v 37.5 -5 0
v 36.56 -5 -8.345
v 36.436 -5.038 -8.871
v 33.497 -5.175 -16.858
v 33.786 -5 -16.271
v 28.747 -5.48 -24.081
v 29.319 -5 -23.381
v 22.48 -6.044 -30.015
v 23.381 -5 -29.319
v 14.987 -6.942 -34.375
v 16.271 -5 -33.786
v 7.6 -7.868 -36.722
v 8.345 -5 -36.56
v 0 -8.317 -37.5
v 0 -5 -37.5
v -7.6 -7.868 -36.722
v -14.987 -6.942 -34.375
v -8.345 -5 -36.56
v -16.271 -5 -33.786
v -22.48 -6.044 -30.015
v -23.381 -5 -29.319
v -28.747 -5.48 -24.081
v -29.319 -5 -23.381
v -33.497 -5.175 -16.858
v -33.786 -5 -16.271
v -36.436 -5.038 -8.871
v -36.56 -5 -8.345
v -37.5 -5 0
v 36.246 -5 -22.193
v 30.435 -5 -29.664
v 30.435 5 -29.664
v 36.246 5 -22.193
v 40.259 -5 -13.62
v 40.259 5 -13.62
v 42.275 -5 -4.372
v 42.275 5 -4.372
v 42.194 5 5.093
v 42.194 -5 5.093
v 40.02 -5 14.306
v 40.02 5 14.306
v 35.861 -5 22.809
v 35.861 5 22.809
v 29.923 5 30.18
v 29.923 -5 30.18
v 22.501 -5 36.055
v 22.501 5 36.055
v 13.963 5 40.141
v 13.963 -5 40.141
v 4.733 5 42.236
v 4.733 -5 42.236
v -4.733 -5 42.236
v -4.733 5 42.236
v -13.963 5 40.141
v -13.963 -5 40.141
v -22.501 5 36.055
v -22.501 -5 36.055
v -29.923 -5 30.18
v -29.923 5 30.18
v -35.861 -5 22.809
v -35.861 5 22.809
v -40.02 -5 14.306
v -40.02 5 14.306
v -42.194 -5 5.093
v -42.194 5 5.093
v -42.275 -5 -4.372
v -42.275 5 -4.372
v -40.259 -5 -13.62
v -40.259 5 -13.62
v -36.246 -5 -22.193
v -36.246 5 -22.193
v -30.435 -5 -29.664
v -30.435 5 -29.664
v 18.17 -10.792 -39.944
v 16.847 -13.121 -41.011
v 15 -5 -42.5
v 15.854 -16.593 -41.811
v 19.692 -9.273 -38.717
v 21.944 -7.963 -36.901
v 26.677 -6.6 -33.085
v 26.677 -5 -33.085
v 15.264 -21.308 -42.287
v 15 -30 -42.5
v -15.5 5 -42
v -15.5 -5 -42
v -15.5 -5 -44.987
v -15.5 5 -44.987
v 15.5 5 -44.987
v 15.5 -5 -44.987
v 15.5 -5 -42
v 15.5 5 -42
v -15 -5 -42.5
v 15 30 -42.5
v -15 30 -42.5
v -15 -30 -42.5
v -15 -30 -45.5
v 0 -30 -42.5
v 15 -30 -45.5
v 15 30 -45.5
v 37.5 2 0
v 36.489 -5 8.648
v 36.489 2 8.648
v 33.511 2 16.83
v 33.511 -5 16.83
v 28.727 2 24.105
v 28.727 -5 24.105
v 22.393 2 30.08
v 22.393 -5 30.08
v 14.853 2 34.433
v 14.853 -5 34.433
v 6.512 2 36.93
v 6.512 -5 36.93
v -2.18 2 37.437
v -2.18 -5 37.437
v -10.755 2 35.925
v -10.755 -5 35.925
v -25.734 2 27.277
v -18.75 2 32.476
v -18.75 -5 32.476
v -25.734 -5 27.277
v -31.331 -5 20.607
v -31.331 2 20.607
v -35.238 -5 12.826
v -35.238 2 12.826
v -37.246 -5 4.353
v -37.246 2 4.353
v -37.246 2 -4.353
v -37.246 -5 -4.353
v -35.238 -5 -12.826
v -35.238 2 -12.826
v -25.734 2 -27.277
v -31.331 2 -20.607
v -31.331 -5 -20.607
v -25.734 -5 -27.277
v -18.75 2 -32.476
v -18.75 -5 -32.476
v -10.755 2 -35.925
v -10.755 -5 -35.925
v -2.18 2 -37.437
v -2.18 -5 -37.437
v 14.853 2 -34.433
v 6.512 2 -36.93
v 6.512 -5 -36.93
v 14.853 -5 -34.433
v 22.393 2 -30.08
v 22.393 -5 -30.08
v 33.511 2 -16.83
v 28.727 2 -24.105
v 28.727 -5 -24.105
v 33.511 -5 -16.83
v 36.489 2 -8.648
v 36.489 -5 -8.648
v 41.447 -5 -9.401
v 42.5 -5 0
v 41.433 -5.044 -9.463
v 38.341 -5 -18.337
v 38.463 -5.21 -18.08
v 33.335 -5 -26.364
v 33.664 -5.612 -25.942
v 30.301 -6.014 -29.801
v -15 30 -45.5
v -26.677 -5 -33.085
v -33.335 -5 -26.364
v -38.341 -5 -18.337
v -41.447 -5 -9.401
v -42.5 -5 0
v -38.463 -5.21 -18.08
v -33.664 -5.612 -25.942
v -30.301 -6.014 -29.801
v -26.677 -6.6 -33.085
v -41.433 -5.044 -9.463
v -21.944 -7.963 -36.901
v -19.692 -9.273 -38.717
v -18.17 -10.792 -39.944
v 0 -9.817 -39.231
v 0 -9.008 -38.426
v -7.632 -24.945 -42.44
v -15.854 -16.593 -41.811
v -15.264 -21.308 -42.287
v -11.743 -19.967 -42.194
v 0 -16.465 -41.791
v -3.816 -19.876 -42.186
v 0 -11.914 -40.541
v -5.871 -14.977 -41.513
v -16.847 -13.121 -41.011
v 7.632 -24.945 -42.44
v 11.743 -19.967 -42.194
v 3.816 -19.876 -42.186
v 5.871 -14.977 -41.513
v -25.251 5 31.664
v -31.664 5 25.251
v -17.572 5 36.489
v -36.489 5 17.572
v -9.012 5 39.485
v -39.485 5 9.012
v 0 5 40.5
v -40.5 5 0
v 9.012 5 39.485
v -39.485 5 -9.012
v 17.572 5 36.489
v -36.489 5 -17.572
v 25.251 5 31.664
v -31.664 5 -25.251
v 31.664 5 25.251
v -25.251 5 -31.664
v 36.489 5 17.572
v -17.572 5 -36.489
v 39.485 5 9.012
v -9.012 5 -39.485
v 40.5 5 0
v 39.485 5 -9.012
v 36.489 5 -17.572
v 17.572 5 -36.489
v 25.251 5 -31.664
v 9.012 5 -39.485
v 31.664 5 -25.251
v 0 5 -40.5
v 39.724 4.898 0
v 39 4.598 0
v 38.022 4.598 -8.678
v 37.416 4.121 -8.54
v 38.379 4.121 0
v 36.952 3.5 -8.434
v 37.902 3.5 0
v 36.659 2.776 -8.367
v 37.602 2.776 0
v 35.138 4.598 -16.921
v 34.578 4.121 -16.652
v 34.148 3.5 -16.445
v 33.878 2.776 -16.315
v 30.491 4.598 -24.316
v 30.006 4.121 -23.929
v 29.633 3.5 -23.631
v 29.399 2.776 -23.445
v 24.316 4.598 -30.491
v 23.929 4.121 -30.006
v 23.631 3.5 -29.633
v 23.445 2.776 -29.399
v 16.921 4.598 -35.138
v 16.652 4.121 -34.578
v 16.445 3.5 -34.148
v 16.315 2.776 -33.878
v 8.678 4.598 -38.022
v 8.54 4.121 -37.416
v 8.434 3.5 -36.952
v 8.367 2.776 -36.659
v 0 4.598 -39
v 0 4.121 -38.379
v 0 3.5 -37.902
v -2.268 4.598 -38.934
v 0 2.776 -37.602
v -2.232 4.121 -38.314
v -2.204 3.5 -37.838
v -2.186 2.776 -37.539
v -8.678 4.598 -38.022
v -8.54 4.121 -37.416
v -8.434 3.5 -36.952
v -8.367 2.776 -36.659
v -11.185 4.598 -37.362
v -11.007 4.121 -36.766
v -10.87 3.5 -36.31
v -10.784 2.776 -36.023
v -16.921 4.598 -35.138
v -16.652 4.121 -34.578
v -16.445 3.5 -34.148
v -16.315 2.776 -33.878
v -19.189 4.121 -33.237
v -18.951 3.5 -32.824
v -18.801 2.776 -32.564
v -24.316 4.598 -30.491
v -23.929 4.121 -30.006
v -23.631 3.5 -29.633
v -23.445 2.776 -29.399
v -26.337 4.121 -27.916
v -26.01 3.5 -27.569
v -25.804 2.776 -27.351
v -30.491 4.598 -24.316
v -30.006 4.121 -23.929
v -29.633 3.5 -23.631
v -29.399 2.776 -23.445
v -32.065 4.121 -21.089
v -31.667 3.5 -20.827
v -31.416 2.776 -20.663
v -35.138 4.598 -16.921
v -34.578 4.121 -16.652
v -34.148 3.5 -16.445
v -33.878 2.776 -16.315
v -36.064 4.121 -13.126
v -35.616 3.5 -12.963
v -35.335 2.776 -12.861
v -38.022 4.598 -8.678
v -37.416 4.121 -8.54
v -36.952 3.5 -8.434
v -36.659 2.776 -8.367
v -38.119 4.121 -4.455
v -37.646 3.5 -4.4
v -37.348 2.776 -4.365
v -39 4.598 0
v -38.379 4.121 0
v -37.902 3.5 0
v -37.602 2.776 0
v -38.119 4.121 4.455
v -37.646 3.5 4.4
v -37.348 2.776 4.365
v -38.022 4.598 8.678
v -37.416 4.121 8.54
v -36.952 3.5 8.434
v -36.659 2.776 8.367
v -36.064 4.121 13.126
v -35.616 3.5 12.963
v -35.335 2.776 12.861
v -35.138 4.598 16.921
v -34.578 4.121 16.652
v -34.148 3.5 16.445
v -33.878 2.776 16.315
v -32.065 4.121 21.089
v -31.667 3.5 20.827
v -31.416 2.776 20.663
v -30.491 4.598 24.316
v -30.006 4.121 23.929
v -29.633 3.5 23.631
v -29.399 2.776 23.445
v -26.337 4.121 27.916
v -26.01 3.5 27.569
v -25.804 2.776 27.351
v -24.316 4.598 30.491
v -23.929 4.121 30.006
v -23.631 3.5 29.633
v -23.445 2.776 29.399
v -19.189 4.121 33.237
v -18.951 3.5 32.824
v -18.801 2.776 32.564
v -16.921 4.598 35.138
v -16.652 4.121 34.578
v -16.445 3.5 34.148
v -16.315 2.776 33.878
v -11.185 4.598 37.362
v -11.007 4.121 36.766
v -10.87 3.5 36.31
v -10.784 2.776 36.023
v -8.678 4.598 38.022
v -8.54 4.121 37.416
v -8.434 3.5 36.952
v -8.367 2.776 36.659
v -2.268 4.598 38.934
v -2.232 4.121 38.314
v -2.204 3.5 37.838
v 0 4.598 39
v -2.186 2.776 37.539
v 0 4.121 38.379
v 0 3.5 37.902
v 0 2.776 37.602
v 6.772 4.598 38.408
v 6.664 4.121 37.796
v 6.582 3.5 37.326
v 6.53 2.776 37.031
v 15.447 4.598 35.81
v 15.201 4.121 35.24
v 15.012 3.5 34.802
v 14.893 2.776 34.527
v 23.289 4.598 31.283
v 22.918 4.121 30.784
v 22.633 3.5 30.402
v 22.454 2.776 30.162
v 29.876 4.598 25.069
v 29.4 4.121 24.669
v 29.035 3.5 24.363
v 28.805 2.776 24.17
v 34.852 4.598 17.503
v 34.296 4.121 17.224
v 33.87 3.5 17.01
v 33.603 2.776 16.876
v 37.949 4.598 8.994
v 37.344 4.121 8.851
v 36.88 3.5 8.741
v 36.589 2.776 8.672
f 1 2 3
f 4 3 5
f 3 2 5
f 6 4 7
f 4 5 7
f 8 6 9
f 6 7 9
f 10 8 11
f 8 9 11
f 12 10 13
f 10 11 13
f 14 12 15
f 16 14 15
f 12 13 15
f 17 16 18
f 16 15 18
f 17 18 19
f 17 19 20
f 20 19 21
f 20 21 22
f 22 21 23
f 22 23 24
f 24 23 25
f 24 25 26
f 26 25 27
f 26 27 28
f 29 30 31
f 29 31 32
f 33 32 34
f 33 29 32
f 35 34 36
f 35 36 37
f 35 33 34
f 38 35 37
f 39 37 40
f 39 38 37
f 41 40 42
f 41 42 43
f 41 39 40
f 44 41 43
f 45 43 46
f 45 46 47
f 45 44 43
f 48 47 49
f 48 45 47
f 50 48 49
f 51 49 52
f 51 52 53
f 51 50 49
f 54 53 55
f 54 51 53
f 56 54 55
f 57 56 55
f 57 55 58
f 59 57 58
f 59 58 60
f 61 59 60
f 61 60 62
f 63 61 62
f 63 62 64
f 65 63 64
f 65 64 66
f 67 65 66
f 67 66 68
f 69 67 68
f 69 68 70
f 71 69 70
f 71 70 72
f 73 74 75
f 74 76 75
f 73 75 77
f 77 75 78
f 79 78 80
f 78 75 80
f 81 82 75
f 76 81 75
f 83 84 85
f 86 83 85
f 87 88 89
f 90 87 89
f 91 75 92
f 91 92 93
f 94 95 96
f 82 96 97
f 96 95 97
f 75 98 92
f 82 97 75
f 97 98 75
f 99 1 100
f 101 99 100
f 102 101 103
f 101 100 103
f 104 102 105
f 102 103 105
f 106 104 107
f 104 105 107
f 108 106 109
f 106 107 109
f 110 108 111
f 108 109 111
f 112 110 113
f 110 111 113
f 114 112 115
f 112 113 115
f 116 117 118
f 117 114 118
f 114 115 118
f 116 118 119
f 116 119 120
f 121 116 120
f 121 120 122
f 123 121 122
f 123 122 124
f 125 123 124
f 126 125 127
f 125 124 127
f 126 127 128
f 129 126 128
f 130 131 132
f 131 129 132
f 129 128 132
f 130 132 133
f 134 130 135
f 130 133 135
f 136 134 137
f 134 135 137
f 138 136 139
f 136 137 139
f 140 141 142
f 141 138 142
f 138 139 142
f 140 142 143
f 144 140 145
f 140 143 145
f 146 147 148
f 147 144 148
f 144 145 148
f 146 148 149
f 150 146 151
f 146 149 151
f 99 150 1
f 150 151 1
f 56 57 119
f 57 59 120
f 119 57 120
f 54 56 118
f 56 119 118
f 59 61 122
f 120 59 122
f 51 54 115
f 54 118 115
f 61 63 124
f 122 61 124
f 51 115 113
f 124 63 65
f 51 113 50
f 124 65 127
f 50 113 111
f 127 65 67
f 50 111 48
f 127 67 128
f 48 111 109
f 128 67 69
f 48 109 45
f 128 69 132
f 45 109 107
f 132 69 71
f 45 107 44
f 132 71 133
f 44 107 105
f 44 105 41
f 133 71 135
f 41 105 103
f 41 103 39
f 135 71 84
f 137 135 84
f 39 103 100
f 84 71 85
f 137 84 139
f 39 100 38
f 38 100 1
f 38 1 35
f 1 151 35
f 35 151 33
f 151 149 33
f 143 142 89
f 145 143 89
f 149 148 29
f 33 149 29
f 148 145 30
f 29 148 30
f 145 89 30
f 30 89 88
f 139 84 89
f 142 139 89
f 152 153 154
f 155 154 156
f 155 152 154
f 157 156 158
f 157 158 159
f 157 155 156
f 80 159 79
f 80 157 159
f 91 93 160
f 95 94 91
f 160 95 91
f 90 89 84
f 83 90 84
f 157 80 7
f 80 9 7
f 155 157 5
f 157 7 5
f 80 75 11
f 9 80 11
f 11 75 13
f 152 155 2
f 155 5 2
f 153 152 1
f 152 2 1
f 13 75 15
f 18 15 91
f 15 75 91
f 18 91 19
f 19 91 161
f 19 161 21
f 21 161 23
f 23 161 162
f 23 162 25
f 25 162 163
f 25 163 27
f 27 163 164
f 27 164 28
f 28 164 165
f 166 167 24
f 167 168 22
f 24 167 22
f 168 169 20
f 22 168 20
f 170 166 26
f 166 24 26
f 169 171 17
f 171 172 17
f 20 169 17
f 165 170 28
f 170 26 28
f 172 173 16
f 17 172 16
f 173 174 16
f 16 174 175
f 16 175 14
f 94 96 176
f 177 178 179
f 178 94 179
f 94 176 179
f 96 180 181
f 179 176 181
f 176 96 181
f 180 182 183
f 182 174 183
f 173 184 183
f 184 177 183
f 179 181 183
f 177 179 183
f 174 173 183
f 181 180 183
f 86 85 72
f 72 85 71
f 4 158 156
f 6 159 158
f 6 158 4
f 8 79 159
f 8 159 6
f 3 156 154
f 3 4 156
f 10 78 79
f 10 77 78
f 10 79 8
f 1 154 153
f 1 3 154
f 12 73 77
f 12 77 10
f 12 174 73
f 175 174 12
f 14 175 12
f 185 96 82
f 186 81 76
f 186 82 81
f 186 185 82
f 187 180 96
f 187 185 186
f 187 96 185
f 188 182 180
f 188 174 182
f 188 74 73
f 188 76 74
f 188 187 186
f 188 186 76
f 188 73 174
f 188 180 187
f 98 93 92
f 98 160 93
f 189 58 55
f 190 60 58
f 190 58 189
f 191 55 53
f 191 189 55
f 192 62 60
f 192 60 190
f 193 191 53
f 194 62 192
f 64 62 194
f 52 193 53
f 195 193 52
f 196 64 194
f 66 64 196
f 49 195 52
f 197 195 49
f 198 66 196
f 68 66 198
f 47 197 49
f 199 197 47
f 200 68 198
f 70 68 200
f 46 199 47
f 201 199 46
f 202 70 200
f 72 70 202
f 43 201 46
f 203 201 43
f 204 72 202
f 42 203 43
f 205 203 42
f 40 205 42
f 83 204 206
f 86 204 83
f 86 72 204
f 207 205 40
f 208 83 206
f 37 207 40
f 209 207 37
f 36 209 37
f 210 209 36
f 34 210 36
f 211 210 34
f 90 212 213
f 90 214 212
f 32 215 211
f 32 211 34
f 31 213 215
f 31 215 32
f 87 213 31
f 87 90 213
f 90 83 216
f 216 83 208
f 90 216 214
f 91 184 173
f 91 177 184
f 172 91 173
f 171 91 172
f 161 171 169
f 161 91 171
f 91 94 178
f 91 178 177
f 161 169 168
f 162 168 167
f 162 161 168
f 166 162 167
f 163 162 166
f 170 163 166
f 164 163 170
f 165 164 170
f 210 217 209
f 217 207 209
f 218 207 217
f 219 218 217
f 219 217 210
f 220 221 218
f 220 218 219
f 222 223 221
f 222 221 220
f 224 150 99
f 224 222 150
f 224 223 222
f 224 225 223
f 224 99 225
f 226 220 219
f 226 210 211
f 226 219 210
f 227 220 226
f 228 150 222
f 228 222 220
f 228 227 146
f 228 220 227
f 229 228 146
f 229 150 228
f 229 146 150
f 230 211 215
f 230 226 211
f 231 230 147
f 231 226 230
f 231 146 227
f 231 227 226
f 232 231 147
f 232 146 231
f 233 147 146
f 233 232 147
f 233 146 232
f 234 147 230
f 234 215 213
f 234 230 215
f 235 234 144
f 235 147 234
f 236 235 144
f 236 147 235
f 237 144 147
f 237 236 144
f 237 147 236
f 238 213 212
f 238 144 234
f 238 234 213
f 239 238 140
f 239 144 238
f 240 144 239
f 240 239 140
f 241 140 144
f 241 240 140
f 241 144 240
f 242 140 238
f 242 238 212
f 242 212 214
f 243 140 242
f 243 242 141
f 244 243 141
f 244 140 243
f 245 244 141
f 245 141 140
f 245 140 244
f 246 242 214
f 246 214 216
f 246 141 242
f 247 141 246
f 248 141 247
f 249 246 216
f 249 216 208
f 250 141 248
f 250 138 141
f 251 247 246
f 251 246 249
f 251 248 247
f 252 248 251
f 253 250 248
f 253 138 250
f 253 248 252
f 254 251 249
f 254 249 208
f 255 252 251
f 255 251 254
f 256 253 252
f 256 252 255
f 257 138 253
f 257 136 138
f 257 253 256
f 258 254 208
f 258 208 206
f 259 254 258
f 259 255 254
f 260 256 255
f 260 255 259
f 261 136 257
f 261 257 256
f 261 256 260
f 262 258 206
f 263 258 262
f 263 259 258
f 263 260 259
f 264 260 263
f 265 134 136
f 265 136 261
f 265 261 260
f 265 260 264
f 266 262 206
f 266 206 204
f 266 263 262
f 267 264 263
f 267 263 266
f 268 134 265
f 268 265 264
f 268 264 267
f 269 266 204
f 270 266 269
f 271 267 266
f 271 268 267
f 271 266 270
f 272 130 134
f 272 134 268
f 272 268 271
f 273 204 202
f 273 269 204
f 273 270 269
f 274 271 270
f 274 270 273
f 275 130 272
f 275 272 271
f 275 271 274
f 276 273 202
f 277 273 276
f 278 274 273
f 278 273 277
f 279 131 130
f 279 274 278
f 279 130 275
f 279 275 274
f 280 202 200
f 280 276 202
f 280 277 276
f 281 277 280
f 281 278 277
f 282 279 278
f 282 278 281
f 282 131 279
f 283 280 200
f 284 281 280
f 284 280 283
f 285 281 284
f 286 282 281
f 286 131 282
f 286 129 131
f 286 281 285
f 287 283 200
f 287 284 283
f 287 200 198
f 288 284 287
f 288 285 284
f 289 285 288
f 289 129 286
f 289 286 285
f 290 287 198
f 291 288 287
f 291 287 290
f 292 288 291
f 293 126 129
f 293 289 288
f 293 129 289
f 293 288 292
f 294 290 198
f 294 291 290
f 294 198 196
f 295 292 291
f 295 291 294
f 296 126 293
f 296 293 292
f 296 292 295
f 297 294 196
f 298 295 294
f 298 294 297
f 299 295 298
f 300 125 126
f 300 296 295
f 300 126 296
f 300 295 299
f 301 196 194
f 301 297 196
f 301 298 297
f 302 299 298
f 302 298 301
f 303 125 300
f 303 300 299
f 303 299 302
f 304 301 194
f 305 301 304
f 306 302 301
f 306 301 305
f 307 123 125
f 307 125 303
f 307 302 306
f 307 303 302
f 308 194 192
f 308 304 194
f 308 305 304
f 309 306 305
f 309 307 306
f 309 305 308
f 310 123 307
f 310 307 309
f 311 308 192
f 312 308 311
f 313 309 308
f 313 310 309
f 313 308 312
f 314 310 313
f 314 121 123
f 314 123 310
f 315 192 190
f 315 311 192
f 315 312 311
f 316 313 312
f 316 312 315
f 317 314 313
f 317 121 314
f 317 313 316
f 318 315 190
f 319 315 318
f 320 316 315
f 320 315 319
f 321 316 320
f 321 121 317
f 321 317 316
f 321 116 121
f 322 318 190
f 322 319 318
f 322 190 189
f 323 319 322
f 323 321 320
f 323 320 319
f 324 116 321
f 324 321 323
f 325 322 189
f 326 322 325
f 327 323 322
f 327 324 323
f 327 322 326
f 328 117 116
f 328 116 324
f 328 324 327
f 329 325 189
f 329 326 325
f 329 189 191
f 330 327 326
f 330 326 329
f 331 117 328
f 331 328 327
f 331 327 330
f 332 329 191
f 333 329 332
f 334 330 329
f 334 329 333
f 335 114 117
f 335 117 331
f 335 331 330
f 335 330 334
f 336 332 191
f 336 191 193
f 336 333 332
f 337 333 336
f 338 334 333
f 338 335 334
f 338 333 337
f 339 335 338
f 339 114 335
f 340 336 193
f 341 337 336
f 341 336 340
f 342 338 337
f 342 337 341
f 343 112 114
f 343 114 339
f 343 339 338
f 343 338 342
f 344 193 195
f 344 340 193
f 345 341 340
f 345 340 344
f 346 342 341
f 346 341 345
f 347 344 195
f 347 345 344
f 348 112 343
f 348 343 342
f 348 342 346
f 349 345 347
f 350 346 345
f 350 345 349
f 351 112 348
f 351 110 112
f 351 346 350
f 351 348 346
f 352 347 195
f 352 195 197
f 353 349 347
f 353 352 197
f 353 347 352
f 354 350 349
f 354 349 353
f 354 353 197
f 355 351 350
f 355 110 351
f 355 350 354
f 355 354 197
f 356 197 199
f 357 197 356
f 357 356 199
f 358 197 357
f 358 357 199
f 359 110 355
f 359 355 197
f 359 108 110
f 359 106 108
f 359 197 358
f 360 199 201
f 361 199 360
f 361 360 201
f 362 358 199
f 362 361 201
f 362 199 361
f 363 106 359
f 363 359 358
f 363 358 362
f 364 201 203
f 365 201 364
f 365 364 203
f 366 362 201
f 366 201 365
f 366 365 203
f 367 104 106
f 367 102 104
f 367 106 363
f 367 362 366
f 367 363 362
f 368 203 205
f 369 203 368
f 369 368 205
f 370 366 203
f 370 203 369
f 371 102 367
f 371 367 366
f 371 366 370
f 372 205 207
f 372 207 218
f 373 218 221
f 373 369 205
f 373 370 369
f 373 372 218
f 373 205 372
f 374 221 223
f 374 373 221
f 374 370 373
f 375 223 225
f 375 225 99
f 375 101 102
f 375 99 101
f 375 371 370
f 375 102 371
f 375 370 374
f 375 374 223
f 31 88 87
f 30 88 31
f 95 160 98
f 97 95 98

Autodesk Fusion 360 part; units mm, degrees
sketch "Sketch1" plane through (0, 0, 0) normal (0, 1, 0) x (1, 0, 0) in component "Stand"
  circle A0 centre (0, 0) radius 37.5
  circle A1 centre (0, 0) radius 42.5
  line L0 (-15, 45.5) -> (15, 45.5)
  line L1 (15, 45.5) -> (15, 42.5)
  line L2 (15, 42.5) -> (-15, 42.5)
  line L3 (-15, 42.5) -> (-15, 45.5)
  line L4 (0, 0) -> (0, 45.5) construction
  line L5 (-15, 45.5) -> (-30.4348, 29.6644)
  line L6 (15, 45.5) -> (30.4348, 29.6644)
  dimension "d1" = 75
  dimension "d2" = 85
  dimension "d3" = 3
  dimension "d4" = 30
extrude "Extrude1" add sketch "Sketch1" along normal mid plane 10 contours A1 | A1 L1 L2 L6 | A1 L2 L3 L5 makes body 1 in component "Stand"
extrude "Extrude1'" add sketch "Sketch1" along normal mid plane 60 separate body contours L0 L1 L2 L3 makes body 2 in component "Clip"
sketch "Sketch1 (2)" plane through (0, 0, 0) normal (1, 0, 0) x (0, 0, -1) in component "Clip"
  line L0 (42.5, 30) -> (42.5, -30) construction
  line L1 (37.5, -5) -> (-37.5, -5) construction
  spline S0 degree 2 poles (42.5, -30) (42.5, -5) (0, -5) knots 0 0 0 5.982942 5.982942 5.982942 weights 1 3 1
  line L2 (42.5, -30) -> (42.5, -5)
  line L3 (42.5, -5) -> (0, -5)
extrude "Extrude2" add sketch "Sketch1 (2)" along normal mid plane 85 bodies 2 in component "Clip"
extrude "Extrude3" cut sketch "Sketch1" against normal blind 50 contours A0 bodies 2 in component "Clip"
sketch "Sketch2" plane through (0, -5, 0) normal (0, 1, 0) x (-1, 0, 0) in component "Clip"
  arc A0 (-37.5, 0) -> (37.5, 0) centre (0, 0) ccw
  line L0 (-37.5, 0) -> (-42.5, 0)
  line L1 (-42.5, 0) -> (-42.5, -42.5)
  line L2 (-42.5, -42.5) -> (-15, -42.5)
  line L3 (-15, -42.5) -> (15, -42.5)
  line L4 (15, -42.5) -> (42.5, -42.5)
  line L5 (42.5, -42.5) -> (42.5, 0)
  line L6 (42.5, 0) -> (37.5, 0)
  circle A1 centre (0, 0) radius 37.5 construction
  line L7 (-15, -42.5) -> (15, -42.5) construction
  line L8 (15, -42.5) -> (15, -45.5) construction
  line L9 (15, -45.5) -> (30.4348, -29.6644) construction
  arc A2 (30.4348, -29.6644) -> (-30.4348, -29.6644) centre (0, 0) ccw construction
  line L10 (-30.4348, -29.6644) -> (-15, -45.5) construction
  line L11 (-15, -45.5) -> (-15, -42.5) construction
  line L12 (42.5, 0) -> (42.5, -42.5)
  line L13 (-42.5, -42.5) -> (-42.5, 0)
  line L14 (-15, -42.5) -> (-26.6769, -33.0846)
  line L15 (15, -42.5) -> (26.6769, -33.0846)
  circle A3 centre (0, 0) radius 42.5
extrude "Extrude4" cut sketch "Sketch2" against normal through all contours L1 L2 L13 L14 A3 | L4 L5 L12 L15 A3 bodies 2 in component "Clip"
fillet "Fillet1" radius 3 1 edges at (-34.9623, 5, -13.5606) on bodies 1 in component "Stand"
move_face "OffsetFaces1" offset -0.5 1 faces at (5, -1.6667, -42.5) on bodies 1 in component "Stand"
move_face "OffsetFaces2" offset -0.5 1 faces at (15, -1.6667, -44.3333) on bodies 1 in component "Stand"
move_face "OffsetFaces3" offset -0.5 1 faces at (-15, 1.6667, -43.1667) on bodies 1 in component "Stand"
component "Stand" placed x (1, 0, 0) y (0, 1, 0) z (0, 0, 1) at (0, 0, 0)
component "Clip" placed x (1, 0, 0) y (0, 1, 0) z (0, 0, 1) at (0, 0, 0) in component "Stand"
